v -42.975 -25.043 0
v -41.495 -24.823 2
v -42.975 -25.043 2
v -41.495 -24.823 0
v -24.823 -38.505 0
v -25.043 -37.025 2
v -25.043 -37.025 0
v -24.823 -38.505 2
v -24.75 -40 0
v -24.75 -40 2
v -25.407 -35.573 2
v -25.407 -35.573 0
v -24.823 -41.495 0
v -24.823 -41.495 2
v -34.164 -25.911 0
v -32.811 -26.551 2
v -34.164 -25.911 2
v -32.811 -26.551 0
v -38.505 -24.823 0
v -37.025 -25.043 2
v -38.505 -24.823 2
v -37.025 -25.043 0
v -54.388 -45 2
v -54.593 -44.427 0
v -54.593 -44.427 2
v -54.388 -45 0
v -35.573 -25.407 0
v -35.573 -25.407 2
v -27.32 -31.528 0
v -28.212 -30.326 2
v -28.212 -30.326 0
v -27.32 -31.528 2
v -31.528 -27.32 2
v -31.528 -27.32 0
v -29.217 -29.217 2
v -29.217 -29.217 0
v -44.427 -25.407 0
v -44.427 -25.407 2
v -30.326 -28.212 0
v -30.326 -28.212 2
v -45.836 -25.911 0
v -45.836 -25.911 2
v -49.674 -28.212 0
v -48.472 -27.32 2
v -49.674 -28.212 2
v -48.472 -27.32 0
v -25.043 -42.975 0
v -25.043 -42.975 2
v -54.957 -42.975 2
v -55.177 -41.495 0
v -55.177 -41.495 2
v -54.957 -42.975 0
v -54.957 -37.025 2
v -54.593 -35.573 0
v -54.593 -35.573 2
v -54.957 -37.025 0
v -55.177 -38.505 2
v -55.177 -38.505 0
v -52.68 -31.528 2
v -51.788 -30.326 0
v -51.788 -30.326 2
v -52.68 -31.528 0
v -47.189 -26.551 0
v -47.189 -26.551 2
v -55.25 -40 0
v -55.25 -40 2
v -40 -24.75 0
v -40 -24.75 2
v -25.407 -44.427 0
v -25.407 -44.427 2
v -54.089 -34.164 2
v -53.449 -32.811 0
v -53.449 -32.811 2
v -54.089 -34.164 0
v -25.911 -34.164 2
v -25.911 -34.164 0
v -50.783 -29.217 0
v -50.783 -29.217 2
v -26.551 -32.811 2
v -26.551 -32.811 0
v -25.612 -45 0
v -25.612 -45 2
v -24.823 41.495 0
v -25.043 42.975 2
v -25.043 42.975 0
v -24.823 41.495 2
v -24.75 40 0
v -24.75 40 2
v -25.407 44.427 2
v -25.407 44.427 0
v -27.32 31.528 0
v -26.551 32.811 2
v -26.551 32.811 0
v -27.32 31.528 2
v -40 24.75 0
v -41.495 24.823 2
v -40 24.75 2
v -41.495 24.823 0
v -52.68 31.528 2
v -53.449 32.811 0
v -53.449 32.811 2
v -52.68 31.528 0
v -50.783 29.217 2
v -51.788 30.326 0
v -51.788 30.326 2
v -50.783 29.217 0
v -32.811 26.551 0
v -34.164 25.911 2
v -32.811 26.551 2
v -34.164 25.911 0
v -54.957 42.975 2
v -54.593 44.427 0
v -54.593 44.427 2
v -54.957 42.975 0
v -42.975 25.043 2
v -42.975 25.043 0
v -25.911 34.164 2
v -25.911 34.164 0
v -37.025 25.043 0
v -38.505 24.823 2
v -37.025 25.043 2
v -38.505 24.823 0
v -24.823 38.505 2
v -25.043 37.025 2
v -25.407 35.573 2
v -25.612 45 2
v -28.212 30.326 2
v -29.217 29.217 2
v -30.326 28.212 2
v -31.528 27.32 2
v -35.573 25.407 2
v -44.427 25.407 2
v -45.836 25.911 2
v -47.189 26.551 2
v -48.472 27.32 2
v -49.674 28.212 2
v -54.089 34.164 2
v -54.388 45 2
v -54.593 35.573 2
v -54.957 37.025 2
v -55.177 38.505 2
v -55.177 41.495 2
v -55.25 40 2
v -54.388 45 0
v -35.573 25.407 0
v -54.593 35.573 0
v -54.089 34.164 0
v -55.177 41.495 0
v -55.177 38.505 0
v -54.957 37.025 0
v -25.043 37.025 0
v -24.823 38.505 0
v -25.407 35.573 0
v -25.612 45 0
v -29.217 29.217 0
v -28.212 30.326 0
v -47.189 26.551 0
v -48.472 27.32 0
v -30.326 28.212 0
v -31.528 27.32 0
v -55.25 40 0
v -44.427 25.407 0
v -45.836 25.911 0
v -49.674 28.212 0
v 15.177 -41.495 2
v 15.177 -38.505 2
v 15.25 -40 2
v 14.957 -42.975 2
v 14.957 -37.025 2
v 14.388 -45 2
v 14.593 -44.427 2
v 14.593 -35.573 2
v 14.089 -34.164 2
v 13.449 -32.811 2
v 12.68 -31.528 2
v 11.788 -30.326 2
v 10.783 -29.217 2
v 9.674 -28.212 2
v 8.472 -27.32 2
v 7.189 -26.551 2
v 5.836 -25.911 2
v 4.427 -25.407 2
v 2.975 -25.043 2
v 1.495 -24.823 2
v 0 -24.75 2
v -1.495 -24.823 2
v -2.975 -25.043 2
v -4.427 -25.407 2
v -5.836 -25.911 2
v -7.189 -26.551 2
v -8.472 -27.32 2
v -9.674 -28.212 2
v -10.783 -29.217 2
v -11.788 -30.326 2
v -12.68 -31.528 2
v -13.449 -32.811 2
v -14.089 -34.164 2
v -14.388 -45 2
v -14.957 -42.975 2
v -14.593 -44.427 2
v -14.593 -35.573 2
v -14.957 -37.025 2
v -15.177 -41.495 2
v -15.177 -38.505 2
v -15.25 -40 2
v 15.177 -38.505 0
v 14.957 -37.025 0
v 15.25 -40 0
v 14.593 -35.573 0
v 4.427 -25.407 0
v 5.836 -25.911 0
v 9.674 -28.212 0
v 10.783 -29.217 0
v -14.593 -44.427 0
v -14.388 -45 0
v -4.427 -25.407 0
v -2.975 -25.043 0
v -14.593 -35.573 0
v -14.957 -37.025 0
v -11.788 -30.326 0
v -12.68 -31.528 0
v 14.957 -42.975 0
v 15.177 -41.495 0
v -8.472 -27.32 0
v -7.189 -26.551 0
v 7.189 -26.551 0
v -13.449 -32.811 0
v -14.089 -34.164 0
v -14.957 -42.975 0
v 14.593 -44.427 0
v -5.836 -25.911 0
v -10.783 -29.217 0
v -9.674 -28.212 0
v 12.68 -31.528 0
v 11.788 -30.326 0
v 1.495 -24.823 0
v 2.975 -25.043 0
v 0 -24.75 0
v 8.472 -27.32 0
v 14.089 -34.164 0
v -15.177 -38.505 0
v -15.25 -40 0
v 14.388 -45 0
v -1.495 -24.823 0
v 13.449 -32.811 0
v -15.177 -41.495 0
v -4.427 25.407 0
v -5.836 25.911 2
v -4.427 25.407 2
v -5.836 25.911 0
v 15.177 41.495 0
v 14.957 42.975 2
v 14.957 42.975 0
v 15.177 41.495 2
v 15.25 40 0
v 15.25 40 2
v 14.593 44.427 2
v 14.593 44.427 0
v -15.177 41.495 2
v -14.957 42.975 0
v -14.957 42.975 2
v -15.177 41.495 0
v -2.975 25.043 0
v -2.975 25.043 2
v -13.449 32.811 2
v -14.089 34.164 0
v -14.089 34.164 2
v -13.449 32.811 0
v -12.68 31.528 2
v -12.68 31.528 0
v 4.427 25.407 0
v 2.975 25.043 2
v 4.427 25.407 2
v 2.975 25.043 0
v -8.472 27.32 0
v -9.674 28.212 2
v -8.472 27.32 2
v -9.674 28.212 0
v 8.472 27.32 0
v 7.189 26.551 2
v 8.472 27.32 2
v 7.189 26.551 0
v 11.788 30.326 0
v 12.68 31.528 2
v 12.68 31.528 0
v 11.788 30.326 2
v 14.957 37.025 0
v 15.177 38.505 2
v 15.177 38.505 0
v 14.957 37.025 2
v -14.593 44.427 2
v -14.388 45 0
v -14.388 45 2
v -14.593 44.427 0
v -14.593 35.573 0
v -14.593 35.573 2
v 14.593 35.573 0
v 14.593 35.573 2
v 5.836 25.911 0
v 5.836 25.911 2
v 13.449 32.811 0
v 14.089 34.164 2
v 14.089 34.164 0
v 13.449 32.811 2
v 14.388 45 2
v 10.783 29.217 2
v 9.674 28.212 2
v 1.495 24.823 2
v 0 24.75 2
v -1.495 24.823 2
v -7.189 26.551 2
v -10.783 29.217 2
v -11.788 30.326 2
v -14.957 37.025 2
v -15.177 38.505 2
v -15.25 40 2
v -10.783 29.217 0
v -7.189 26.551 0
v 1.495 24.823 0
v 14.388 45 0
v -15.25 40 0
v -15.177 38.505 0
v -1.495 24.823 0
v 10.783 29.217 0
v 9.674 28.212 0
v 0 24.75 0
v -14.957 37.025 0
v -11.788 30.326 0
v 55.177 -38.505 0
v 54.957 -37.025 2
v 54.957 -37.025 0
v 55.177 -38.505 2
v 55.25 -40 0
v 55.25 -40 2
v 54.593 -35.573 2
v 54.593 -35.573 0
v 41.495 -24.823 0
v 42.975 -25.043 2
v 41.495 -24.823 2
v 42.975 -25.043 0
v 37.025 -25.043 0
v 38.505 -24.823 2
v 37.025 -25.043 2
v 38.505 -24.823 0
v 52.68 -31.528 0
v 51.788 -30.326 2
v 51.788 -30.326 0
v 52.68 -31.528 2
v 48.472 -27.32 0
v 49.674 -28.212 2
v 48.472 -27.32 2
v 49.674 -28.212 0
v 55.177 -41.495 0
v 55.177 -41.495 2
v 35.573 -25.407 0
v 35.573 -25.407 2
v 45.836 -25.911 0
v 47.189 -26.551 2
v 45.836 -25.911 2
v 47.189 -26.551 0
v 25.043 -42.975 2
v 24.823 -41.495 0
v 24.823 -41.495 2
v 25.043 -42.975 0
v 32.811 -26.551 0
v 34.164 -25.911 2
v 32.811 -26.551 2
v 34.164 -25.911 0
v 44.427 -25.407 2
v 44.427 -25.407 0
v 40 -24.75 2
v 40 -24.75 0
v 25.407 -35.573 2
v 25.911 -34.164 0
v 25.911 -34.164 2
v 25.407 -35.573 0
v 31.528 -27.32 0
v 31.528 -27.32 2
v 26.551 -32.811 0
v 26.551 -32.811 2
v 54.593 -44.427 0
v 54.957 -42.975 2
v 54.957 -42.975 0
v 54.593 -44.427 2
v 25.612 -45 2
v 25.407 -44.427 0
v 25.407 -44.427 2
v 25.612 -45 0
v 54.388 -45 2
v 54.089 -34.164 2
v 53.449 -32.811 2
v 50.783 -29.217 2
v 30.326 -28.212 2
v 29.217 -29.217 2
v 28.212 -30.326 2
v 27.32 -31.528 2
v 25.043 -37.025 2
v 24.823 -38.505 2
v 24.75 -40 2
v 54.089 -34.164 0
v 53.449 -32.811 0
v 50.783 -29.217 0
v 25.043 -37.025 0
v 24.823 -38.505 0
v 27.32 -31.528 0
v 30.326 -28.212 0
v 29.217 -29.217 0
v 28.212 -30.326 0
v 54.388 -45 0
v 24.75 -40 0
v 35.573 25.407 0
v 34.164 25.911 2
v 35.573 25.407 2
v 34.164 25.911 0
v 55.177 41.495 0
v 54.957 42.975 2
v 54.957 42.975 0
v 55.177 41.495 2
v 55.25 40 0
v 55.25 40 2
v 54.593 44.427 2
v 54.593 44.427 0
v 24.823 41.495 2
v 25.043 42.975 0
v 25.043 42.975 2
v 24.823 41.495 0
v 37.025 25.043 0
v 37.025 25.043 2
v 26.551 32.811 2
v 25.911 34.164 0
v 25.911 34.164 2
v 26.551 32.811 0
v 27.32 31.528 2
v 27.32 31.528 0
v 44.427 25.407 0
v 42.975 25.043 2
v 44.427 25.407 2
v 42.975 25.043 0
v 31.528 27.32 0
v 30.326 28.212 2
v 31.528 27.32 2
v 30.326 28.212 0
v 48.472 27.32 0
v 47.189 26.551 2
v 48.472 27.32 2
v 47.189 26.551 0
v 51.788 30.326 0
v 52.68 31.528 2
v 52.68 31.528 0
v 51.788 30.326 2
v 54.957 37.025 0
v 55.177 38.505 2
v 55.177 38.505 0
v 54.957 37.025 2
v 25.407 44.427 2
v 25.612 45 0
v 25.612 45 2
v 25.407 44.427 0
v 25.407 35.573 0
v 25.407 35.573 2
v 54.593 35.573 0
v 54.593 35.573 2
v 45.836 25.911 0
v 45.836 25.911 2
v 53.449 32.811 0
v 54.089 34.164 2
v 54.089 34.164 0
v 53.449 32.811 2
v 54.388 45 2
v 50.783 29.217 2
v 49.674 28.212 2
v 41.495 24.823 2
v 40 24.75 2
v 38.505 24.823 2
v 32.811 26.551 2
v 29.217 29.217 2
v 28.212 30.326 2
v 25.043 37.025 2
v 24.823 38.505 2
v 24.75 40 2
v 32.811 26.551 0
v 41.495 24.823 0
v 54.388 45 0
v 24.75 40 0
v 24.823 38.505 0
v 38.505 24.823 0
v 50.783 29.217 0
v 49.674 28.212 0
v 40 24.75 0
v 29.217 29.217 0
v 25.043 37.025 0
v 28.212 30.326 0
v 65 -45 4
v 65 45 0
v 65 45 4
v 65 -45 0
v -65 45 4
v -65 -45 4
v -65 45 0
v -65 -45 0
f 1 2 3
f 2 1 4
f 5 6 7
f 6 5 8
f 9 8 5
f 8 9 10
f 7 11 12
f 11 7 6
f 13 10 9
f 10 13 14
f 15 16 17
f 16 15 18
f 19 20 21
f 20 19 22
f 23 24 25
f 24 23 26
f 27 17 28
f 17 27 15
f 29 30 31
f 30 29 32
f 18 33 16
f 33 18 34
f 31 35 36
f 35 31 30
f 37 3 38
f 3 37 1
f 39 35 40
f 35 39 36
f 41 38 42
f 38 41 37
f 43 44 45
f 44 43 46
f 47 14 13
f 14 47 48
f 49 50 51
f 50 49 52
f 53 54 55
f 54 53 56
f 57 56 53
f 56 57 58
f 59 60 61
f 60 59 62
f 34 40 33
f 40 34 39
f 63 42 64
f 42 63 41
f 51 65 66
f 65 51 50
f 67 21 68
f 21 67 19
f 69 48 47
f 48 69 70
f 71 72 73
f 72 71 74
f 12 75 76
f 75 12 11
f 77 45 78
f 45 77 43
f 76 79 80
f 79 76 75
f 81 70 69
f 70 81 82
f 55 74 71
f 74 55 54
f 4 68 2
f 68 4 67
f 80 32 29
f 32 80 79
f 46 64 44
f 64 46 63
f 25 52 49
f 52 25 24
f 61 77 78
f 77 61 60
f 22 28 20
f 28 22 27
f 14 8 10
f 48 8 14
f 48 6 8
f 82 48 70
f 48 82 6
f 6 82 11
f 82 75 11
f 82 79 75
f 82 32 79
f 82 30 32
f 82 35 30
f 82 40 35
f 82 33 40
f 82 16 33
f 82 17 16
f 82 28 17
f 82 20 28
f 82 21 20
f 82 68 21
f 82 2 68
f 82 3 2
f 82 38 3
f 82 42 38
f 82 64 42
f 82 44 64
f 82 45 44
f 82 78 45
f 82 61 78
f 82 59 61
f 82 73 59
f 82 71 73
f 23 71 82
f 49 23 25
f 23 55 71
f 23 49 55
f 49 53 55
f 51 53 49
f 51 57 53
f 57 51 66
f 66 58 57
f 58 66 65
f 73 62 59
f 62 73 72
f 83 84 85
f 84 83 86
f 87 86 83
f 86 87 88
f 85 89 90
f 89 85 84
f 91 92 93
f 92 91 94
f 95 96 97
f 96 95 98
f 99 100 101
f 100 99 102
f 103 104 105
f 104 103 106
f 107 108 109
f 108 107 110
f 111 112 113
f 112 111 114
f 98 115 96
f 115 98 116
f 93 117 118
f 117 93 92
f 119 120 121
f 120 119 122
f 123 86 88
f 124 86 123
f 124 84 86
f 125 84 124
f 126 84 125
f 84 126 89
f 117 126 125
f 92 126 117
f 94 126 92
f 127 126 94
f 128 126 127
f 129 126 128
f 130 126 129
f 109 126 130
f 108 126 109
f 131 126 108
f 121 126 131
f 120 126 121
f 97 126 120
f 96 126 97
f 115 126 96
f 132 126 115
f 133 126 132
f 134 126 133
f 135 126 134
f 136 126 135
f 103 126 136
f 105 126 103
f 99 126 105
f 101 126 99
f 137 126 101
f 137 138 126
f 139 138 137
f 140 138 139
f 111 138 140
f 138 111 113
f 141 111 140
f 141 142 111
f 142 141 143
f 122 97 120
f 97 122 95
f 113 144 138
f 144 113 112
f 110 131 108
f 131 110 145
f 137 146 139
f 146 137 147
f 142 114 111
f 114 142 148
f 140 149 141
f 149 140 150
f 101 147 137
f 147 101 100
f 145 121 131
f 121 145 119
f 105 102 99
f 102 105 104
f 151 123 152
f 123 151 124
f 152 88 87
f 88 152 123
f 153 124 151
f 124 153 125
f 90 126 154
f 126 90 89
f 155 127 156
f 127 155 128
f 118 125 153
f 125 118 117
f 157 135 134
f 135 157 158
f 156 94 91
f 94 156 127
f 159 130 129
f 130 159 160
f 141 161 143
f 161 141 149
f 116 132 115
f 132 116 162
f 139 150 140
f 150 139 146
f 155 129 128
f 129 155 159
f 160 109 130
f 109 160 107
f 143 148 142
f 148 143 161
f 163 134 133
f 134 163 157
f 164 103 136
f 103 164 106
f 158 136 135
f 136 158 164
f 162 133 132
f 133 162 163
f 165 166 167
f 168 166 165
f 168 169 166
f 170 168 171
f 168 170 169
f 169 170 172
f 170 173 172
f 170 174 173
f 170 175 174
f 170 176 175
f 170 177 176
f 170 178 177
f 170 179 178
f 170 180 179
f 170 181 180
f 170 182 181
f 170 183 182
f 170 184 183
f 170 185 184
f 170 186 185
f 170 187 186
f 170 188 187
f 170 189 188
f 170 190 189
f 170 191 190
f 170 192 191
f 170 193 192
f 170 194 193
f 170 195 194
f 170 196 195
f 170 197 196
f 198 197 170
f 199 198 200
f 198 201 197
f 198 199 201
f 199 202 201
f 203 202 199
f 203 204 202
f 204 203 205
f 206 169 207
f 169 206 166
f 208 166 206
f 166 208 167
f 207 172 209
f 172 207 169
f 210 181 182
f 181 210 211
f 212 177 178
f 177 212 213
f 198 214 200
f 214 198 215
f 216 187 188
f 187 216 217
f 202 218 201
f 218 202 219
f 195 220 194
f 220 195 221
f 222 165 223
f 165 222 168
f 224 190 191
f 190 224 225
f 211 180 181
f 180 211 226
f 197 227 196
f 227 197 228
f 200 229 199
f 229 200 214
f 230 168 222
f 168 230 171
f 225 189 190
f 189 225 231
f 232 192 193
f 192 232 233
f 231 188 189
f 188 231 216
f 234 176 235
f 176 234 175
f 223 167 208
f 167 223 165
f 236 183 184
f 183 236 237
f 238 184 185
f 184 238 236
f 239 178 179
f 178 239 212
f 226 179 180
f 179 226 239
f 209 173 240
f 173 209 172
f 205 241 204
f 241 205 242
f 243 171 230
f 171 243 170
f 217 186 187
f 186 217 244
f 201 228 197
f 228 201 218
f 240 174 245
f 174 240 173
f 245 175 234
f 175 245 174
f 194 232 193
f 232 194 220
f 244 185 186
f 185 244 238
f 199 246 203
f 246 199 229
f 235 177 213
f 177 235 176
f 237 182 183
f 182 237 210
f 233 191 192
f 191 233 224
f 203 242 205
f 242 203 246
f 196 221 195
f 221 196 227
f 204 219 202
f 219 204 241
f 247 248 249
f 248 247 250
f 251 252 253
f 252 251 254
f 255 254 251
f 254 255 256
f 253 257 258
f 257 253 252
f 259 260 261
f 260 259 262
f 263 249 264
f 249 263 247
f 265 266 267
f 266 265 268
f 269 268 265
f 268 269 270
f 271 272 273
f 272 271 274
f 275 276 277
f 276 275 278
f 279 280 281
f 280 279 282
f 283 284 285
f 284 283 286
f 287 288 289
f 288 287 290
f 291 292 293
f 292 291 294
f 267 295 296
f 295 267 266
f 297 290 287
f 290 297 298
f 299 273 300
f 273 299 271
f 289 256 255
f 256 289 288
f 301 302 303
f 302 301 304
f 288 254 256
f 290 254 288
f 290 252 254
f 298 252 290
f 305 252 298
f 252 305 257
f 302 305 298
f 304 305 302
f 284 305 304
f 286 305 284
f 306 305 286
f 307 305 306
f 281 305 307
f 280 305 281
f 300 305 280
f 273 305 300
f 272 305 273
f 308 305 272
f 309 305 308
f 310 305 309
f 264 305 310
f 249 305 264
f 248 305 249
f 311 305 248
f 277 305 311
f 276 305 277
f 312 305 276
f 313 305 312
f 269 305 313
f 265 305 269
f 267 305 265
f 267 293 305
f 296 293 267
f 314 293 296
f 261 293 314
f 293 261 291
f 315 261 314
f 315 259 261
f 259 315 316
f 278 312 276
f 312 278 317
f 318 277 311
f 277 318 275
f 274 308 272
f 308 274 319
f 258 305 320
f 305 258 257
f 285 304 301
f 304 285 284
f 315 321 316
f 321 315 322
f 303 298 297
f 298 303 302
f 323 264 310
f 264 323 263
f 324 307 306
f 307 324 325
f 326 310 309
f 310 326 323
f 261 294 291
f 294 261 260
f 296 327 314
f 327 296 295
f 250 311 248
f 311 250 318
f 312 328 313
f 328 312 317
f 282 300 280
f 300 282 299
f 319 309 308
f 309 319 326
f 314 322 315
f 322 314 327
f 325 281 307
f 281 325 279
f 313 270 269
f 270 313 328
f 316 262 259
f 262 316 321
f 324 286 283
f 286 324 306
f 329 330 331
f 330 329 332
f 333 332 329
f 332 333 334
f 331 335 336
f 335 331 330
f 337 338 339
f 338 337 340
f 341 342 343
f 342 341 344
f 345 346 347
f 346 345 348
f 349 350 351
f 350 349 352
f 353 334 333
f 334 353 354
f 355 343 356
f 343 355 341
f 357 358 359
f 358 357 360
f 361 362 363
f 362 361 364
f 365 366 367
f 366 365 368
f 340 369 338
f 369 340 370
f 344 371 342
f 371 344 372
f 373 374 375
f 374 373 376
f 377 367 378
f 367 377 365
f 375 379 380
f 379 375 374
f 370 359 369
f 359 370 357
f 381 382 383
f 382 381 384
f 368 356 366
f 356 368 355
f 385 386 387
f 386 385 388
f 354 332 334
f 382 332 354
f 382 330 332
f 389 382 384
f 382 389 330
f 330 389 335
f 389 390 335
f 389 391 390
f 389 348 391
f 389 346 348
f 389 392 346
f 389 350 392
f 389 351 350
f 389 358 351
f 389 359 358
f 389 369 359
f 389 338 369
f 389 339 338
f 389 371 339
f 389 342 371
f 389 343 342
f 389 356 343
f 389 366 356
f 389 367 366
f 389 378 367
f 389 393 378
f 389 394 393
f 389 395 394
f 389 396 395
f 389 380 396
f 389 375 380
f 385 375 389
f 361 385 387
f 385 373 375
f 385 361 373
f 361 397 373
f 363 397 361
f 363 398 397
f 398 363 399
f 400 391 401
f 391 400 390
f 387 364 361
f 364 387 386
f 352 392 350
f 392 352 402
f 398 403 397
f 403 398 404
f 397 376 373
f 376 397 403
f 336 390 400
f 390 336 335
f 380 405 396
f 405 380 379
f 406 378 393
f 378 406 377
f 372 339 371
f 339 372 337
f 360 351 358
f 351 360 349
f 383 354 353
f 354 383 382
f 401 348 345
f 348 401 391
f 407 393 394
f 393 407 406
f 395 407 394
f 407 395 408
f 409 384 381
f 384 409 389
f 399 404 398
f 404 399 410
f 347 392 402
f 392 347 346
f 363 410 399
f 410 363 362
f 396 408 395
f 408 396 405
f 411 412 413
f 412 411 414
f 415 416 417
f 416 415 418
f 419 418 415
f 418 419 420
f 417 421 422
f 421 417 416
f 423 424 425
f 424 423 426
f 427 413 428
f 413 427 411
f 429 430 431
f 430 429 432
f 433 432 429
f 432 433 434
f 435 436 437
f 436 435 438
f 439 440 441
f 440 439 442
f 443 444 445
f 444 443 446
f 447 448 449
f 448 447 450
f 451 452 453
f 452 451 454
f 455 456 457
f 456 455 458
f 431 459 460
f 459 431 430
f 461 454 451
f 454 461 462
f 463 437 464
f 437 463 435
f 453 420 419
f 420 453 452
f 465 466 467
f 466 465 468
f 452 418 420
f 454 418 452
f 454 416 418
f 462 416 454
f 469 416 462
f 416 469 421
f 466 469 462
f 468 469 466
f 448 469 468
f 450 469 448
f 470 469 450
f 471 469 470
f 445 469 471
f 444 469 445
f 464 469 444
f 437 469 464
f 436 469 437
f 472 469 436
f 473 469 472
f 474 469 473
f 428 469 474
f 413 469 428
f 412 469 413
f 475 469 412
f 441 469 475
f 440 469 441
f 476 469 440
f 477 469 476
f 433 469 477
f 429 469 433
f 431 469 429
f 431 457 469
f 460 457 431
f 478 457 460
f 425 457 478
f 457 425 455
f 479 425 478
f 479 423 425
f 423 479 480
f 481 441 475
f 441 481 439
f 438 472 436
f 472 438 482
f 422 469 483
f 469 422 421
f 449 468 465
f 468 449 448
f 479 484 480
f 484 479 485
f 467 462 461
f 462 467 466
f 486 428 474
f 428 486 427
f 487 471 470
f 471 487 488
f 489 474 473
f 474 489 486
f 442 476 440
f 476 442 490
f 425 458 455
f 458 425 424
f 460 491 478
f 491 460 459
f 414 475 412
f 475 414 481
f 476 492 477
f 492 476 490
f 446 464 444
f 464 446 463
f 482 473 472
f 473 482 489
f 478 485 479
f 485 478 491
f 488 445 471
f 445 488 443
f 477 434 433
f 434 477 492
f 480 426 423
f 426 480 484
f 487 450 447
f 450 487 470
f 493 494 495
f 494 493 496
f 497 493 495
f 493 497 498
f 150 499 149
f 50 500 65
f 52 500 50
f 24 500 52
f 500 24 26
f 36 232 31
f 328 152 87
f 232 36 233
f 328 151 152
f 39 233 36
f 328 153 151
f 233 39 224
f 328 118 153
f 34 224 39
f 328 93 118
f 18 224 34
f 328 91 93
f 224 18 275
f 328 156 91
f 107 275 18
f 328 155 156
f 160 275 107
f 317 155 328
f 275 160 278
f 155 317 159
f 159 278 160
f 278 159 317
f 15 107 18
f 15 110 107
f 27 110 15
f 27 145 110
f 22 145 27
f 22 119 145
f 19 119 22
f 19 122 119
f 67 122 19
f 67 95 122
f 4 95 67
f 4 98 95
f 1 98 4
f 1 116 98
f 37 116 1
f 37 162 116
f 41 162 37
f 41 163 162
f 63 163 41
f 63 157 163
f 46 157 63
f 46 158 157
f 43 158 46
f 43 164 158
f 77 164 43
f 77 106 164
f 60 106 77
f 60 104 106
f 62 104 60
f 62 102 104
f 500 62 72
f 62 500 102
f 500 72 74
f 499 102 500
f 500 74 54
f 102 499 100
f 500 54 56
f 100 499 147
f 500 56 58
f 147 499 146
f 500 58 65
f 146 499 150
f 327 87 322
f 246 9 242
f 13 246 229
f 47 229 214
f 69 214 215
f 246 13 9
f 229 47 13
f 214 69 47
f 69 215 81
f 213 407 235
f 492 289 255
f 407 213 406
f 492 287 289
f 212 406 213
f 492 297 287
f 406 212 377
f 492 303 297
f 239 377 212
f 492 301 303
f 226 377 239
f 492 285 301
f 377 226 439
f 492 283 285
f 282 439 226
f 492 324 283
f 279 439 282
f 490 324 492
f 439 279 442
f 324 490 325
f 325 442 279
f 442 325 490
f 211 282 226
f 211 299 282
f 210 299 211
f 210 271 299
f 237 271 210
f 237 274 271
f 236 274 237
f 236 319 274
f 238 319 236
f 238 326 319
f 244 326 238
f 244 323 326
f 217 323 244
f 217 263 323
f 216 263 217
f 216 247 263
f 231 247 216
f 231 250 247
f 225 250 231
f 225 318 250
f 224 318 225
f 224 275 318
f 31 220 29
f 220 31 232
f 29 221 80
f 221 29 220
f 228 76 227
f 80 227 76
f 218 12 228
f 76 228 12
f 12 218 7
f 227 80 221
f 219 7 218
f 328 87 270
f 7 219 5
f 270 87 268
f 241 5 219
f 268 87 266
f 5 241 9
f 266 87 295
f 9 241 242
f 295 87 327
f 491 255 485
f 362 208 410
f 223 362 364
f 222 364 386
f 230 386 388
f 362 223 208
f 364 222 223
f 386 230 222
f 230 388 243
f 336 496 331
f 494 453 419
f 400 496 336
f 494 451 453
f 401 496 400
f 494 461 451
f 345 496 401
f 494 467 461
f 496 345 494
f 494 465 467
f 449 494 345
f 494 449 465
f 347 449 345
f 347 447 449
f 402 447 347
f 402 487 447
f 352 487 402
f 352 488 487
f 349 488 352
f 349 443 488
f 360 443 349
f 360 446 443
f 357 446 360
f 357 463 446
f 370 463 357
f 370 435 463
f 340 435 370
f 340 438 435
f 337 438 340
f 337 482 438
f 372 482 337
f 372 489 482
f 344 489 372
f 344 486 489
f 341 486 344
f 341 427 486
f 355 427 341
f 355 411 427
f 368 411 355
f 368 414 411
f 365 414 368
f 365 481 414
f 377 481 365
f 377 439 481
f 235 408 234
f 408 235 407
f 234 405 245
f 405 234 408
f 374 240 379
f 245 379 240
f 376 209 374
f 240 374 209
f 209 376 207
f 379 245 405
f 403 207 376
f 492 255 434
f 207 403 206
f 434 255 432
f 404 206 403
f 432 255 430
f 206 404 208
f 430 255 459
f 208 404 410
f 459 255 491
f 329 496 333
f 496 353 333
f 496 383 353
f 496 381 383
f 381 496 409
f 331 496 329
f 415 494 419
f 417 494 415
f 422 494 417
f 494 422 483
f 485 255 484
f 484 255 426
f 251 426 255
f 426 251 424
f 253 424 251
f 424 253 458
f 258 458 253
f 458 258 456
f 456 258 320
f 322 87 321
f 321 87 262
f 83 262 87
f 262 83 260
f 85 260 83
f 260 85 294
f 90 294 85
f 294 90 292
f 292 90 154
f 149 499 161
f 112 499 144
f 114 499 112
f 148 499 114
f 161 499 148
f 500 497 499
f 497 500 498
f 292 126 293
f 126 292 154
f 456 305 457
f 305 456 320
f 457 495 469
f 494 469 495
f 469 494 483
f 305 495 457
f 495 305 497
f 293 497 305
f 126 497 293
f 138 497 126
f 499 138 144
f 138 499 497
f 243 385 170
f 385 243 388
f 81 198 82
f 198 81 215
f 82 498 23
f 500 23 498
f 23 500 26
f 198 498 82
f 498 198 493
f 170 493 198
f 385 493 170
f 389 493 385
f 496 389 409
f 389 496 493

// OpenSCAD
// Dimensions (mm)
plate_x = 130;
plate_y = 90;
plate_z = 4;

hole_diameter = 30.5;
hole_radius = hole_diameter / 2;

// Grid layout: 2 rows (Y) x 3 columns (X)
// 40 mm center-to-center spacing
grid_spacing_x = 40;
grid_spacing_y = 40;

// Wall dimensions
wall_length = plate_x;
wall_thickness = 4;
wall_height = 70;

// Quality
$fn = 64;

// Main structure
difference() {
    // Base plate, resting on z=0, centered at origin
    translate([-plate_x/2, -plate_y/2, 0])
        cube([plate_x, plate_y, plate_z]);

    // Side walls (long edges along X)
    // Left wall (at y = -plate_y/2), extending outward
    translate([-wall_length/2, -plate_y/2 - wall_thickness, 0])
        cube([wall_length, wall_thickness, wall_height]);

    // Right wall (at y = +plate_y/2), extending outward
    translate([-wall_length/2, plate_y/2, 0])
        cube([wall_length, wall_thickness, wall_height]);

    // Holes: 2 rows (Y) x 3 columns (X)
    // Centers at:
    // X: -40, 0, +40
    // Y: -20, +20
    for (xi = [-1, 0, 1]) {
        for (yi = [-1, 1]) {
            translate([xi * grid_spacing_x, yi * grid_spacing_y, -1])
                cylinder(r = hole_radius, h = plate_z + 2, center = true);
        }
    }
}
